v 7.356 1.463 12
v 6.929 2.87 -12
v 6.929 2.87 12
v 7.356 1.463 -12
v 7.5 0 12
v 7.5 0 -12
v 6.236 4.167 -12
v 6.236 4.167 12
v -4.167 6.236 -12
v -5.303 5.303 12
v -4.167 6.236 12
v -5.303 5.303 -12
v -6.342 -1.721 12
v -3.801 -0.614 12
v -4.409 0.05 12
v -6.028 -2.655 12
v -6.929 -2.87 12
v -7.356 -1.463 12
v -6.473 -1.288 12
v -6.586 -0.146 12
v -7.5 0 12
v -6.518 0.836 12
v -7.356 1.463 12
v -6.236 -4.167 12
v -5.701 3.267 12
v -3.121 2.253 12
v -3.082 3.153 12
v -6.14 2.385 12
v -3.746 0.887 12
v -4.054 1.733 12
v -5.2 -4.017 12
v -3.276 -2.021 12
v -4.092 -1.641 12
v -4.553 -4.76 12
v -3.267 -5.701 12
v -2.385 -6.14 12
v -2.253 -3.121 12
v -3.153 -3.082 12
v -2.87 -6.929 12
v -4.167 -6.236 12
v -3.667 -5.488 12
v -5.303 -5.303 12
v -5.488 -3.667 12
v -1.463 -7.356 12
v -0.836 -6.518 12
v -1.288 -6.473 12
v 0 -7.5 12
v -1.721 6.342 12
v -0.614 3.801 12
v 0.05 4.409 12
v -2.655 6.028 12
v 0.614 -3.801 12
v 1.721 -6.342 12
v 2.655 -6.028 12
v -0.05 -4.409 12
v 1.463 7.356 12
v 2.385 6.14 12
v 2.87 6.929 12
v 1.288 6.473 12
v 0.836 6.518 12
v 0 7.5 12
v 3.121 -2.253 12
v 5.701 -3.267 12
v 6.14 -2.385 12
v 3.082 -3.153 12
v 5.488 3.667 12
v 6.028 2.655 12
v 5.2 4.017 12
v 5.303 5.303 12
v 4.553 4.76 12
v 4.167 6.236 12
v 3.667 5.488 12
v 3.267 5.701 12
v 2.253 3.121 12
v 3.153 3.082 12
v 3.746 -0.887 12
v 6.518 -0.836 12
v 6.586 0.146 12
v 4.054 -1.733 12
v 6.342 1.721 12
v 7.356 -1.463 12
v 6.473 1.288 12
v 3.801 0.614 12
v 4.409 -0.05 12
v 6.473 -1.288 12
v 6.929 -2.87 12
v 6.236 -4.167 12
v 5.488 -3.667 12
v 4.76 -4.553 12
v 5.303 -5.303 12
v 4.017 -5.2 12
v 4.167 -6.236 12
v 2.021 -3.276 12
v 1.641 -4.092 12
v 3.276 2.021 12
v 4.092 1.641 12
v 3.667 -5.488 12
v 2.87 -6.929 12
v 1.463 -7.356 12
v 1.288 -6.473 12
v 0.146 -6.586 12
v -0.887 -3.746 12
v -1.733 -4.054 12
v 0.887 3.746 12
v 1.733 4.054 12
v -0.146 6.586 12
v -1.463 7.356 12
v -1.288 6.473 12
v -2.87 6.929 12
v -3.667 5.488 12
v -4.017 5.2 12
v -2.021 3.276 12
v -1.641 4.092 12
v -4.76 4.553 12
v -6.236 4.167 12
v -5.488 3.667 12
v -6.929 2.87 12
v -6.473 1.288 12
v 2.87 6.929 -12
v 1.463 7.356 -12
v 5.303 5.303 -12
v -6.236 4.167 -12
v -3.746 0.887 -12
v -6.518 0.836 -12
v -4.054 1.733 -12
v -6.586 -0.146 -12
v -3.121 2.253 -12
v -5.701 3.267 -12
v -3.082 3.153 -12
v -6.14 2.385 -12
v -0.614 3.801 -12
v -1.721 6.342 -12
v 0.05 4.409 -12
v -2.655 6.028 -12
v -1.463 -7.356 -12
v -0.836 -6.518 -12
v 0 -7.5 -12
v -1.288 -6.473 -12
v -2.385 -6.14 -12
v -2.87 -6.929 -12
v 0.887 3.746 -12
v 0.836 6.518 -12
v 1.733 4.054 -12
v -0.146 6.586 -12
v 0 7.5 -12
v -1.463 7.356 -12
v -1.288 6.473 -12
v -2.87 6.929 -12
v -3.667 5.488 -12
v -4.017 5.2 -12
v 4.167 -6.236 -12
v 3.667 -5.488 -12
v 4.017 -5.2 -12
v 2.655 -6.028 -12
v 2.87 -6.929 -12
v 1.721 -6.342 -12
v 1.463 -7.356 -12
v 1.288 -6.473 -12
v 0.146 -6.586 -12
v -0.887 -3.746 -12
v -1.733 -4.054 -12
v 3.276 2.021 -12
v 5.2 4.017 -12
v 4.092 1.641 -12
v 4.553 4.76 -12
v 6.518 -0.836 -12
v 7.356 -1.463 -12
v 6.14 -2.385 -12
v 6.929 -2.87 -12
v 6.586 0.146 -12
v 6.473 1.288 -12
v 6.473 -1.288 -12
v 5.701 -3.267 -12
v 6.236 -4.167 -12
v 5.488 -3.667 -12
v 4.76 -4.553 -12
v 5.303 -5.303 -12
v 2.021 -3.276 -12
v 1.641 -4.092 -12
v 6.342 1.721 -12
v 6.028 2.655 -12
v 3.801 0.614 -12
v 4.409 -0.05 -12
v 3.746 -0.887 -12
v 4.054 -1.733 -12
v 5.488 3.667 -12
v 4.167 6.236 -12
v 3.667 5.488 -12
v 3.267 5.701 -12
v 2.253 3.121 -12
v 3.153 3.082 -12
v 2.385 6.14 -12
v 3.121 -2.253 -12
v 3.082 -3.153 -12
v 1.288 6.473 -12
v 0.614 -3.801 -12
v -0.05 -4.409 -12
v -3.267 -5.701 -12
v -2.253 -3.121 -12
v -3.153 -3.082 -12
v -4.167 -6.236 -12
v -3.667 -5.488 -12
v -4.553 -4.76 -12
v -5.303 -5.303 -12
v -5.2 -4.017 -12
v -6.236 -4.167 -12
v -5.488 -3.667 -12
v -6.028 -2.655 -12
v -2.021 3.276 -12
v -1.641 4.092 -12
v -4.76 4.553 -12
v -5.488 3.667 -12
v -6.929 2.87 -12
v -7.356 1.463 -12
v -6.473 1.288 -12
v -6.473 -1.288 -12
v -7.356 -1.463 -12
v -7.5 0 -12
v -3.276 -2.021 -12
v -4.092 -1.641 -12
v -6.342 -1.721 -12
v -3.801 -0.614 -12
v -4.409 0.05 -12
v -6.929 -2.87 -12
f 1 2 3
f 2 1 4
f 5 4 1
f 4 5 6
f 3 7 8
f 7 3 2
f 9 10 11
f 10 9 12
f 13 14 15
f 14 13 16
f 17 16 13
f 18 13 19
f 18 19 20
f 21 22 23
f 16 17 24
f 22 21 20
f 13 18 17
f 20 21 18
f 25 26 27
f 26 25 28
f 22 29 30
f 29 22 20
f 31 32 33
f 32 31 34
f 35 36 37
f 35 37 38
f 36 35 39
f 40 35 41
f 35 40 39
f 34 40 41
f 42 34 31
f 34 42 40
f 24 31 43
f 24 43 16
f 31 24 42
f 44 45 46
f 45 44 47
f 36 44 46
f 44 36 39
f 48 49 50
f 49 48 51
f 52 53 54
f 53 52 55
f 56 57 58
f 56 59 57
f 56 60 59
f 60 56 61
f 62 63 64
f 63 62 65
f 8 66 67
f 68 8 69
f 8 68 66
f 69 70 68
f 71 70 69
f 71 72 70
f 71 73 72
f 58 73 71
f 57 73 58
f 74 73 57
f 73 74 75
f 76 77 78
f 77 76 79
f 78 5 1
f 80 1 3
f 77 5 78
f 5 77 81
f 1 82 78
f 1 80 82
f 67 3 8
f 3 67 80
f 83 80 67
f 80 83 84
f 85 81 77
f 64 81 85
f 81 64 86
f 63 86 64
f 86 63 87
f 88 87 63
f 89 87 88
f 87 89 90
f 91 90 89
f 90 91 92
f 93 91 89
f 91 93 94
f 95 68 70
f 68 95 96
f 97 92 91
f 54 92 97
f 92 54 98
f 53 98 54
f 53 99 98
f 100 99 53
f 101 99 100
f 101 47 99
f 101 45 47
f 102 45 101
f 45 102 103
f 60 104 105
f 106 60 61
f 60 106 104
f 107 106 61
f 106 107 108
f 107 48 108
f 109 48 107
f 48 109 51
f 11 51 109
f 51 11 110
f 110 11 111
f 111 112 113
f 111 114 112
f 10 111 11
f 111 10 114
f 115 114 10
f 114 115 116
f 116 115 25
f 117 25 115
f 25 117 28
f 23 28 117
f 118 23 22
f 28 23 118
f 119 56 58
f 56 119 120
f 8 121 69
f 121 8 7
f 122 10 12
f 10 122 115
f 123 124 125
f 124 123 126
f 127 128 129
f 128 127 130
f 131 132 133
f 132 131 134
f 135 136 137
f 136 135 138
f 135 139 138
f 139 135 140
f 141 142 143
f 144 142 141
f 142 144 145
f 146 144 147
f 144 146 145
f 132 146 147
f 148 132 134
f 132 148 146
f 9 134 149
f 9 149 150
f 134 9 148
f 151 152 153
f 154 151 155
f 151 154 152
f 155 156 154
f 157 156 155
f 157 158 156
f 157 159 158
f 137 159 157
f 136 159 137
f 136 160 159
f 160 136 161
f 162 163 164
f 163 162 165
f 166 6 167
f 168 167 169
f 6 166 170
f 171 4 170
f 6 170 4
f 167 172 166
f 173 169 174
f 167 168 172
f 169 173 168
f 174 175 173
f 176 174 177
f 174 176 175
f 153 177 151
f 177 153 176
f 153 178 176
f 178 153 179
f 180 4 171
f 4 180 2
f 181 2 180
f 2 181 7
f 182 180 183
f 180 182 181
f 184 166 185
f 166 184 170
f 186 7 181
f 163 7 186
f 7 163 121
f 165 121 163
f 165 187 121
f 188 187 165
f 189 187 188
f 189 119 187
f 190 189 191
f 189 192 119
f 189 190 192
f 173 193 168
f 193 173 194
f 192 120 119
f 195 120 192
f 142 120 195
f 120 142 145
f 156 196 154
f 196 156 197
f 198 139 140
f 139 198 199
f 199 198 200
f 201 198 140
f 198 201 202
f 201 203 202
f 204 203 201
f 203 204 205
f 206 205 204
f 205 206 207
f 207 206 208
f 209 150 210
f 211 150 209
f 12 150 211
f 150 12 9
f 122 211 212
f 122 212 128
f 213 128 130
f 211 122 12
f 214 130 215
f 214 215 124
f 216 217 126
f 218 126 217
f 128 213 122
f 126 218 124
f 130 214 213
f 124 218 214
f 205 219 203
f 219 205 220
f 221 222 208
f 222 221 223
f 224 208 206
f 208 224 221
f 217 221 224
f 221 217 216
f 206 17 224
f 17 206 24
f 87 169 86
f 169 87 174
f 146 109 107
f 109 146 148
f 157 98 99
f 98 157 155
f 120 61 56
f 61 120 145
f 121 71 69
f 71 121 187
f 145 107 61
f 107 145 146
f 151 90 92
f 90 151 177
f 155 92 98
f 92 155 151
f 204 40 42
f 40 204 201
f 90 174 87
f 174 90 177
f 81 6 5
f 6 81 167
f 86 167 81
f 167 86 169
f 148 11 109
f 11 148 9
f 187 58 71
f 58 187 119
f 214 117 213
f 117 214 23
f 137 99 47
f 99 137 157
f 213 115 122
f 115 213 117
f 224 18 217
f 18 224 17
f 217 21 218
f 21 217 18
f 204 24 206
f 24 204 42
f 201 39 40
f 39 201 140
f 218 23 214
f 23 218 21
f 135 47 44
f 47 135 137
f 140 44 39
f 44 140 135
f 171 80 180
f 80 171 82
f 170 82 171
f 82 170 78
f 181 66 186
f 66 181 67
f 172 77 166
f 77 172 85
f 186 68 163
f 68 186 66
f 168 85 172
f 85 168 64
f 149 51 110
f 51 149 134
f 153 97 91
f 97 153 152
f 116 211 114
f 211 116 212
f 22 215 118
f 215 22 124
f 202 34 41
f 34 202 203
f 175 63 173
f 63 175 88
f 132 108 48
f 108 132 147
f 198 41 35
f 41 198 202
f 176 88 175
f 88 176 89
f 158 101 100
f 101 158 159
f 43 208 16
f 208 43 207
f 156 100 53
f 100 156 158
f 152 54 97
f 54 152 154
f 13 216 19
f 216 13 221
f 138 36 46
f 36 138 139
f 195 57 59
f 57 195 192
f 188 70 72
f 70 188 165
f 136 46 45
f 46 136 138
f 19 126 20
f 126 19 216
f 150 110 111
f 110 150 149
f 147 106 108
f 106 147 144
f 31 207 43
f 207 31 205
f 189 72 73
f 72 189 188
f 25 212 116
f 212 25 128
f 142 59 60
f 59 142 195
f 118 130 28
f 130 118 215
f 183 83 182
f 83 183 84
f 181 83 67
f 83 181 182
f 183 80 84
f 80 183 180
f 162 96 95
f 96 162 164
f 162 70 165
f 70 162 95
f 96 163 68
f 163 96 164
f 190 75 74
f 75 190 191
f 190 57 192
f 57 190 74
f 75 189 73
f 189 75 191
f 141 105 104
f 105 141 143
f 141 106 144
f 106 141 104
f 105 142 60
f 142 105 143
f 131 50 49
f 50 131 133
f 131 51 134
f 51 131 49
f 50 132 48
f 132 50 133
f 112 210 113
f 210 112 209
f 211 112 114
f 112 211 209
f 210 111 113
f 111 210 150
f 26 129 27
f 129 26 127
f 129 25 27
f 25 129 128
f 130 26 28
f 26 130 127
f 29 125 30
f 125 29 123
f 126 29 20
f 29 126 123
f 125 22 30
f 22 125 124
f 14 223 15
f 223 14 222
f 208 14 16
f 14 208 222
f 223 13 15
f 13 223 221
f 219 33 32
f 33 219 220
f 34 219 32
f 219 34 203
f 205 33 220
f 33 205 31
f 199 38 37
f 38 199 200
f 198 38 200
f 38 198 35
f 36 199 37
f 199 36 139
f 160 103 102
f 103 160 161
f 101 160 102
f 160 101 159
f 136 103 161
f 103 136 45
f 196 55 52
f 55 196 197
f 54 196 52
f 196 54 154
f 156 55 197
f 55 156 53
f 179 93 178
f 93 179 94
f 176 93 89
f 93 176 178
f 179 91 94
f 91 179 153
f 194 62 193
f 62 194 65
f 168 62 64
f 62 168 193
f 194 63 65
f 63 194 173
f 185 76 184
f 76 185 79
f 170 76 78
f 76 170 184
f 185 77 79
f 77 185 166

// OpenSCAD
module linear_bushing(inside_diameter, inside_factor, outside_diameter,
					  height, sides, angle, wall) {
	intersection() {
		union() {
			difference() {
				cylinder(r=outside_diameter/2, h=height,
						 center=true, $fn=sides*2);
				cylinder(r=outside_diameter/2-wall, h=height+1,
						 center=true, $fn=sides*2);
			}
			for (side = [1 : sides]) {
				rotate([0, 0, 360 * side / sides]) {
					translate([outside_diameter/2, 0, 0])
						rotate([0, 0, angle])
						cube([(outside_diameter-inside_diameter*inside_factor)
							  /cos(angle), wall, height], center=true);
				}
			}
		}
		cylinder(r=outside_diameter/2, h=height, center=true, $fn=sides*2);
	}
}

// This will produce a test grid for wall thickness and inside_factor, then
// you can try which size fits best for your printer and slicer settings.

for (x = [0 : 0]) {
	translate([20*x, 0, 0]) {
		linear_bushing(inside_diameter=8, inside_factor=0.975+0.005*x,
					   outside_diameter=15,
					   height=24, sides=16, angle=20, wall=0.9);
	}
}
